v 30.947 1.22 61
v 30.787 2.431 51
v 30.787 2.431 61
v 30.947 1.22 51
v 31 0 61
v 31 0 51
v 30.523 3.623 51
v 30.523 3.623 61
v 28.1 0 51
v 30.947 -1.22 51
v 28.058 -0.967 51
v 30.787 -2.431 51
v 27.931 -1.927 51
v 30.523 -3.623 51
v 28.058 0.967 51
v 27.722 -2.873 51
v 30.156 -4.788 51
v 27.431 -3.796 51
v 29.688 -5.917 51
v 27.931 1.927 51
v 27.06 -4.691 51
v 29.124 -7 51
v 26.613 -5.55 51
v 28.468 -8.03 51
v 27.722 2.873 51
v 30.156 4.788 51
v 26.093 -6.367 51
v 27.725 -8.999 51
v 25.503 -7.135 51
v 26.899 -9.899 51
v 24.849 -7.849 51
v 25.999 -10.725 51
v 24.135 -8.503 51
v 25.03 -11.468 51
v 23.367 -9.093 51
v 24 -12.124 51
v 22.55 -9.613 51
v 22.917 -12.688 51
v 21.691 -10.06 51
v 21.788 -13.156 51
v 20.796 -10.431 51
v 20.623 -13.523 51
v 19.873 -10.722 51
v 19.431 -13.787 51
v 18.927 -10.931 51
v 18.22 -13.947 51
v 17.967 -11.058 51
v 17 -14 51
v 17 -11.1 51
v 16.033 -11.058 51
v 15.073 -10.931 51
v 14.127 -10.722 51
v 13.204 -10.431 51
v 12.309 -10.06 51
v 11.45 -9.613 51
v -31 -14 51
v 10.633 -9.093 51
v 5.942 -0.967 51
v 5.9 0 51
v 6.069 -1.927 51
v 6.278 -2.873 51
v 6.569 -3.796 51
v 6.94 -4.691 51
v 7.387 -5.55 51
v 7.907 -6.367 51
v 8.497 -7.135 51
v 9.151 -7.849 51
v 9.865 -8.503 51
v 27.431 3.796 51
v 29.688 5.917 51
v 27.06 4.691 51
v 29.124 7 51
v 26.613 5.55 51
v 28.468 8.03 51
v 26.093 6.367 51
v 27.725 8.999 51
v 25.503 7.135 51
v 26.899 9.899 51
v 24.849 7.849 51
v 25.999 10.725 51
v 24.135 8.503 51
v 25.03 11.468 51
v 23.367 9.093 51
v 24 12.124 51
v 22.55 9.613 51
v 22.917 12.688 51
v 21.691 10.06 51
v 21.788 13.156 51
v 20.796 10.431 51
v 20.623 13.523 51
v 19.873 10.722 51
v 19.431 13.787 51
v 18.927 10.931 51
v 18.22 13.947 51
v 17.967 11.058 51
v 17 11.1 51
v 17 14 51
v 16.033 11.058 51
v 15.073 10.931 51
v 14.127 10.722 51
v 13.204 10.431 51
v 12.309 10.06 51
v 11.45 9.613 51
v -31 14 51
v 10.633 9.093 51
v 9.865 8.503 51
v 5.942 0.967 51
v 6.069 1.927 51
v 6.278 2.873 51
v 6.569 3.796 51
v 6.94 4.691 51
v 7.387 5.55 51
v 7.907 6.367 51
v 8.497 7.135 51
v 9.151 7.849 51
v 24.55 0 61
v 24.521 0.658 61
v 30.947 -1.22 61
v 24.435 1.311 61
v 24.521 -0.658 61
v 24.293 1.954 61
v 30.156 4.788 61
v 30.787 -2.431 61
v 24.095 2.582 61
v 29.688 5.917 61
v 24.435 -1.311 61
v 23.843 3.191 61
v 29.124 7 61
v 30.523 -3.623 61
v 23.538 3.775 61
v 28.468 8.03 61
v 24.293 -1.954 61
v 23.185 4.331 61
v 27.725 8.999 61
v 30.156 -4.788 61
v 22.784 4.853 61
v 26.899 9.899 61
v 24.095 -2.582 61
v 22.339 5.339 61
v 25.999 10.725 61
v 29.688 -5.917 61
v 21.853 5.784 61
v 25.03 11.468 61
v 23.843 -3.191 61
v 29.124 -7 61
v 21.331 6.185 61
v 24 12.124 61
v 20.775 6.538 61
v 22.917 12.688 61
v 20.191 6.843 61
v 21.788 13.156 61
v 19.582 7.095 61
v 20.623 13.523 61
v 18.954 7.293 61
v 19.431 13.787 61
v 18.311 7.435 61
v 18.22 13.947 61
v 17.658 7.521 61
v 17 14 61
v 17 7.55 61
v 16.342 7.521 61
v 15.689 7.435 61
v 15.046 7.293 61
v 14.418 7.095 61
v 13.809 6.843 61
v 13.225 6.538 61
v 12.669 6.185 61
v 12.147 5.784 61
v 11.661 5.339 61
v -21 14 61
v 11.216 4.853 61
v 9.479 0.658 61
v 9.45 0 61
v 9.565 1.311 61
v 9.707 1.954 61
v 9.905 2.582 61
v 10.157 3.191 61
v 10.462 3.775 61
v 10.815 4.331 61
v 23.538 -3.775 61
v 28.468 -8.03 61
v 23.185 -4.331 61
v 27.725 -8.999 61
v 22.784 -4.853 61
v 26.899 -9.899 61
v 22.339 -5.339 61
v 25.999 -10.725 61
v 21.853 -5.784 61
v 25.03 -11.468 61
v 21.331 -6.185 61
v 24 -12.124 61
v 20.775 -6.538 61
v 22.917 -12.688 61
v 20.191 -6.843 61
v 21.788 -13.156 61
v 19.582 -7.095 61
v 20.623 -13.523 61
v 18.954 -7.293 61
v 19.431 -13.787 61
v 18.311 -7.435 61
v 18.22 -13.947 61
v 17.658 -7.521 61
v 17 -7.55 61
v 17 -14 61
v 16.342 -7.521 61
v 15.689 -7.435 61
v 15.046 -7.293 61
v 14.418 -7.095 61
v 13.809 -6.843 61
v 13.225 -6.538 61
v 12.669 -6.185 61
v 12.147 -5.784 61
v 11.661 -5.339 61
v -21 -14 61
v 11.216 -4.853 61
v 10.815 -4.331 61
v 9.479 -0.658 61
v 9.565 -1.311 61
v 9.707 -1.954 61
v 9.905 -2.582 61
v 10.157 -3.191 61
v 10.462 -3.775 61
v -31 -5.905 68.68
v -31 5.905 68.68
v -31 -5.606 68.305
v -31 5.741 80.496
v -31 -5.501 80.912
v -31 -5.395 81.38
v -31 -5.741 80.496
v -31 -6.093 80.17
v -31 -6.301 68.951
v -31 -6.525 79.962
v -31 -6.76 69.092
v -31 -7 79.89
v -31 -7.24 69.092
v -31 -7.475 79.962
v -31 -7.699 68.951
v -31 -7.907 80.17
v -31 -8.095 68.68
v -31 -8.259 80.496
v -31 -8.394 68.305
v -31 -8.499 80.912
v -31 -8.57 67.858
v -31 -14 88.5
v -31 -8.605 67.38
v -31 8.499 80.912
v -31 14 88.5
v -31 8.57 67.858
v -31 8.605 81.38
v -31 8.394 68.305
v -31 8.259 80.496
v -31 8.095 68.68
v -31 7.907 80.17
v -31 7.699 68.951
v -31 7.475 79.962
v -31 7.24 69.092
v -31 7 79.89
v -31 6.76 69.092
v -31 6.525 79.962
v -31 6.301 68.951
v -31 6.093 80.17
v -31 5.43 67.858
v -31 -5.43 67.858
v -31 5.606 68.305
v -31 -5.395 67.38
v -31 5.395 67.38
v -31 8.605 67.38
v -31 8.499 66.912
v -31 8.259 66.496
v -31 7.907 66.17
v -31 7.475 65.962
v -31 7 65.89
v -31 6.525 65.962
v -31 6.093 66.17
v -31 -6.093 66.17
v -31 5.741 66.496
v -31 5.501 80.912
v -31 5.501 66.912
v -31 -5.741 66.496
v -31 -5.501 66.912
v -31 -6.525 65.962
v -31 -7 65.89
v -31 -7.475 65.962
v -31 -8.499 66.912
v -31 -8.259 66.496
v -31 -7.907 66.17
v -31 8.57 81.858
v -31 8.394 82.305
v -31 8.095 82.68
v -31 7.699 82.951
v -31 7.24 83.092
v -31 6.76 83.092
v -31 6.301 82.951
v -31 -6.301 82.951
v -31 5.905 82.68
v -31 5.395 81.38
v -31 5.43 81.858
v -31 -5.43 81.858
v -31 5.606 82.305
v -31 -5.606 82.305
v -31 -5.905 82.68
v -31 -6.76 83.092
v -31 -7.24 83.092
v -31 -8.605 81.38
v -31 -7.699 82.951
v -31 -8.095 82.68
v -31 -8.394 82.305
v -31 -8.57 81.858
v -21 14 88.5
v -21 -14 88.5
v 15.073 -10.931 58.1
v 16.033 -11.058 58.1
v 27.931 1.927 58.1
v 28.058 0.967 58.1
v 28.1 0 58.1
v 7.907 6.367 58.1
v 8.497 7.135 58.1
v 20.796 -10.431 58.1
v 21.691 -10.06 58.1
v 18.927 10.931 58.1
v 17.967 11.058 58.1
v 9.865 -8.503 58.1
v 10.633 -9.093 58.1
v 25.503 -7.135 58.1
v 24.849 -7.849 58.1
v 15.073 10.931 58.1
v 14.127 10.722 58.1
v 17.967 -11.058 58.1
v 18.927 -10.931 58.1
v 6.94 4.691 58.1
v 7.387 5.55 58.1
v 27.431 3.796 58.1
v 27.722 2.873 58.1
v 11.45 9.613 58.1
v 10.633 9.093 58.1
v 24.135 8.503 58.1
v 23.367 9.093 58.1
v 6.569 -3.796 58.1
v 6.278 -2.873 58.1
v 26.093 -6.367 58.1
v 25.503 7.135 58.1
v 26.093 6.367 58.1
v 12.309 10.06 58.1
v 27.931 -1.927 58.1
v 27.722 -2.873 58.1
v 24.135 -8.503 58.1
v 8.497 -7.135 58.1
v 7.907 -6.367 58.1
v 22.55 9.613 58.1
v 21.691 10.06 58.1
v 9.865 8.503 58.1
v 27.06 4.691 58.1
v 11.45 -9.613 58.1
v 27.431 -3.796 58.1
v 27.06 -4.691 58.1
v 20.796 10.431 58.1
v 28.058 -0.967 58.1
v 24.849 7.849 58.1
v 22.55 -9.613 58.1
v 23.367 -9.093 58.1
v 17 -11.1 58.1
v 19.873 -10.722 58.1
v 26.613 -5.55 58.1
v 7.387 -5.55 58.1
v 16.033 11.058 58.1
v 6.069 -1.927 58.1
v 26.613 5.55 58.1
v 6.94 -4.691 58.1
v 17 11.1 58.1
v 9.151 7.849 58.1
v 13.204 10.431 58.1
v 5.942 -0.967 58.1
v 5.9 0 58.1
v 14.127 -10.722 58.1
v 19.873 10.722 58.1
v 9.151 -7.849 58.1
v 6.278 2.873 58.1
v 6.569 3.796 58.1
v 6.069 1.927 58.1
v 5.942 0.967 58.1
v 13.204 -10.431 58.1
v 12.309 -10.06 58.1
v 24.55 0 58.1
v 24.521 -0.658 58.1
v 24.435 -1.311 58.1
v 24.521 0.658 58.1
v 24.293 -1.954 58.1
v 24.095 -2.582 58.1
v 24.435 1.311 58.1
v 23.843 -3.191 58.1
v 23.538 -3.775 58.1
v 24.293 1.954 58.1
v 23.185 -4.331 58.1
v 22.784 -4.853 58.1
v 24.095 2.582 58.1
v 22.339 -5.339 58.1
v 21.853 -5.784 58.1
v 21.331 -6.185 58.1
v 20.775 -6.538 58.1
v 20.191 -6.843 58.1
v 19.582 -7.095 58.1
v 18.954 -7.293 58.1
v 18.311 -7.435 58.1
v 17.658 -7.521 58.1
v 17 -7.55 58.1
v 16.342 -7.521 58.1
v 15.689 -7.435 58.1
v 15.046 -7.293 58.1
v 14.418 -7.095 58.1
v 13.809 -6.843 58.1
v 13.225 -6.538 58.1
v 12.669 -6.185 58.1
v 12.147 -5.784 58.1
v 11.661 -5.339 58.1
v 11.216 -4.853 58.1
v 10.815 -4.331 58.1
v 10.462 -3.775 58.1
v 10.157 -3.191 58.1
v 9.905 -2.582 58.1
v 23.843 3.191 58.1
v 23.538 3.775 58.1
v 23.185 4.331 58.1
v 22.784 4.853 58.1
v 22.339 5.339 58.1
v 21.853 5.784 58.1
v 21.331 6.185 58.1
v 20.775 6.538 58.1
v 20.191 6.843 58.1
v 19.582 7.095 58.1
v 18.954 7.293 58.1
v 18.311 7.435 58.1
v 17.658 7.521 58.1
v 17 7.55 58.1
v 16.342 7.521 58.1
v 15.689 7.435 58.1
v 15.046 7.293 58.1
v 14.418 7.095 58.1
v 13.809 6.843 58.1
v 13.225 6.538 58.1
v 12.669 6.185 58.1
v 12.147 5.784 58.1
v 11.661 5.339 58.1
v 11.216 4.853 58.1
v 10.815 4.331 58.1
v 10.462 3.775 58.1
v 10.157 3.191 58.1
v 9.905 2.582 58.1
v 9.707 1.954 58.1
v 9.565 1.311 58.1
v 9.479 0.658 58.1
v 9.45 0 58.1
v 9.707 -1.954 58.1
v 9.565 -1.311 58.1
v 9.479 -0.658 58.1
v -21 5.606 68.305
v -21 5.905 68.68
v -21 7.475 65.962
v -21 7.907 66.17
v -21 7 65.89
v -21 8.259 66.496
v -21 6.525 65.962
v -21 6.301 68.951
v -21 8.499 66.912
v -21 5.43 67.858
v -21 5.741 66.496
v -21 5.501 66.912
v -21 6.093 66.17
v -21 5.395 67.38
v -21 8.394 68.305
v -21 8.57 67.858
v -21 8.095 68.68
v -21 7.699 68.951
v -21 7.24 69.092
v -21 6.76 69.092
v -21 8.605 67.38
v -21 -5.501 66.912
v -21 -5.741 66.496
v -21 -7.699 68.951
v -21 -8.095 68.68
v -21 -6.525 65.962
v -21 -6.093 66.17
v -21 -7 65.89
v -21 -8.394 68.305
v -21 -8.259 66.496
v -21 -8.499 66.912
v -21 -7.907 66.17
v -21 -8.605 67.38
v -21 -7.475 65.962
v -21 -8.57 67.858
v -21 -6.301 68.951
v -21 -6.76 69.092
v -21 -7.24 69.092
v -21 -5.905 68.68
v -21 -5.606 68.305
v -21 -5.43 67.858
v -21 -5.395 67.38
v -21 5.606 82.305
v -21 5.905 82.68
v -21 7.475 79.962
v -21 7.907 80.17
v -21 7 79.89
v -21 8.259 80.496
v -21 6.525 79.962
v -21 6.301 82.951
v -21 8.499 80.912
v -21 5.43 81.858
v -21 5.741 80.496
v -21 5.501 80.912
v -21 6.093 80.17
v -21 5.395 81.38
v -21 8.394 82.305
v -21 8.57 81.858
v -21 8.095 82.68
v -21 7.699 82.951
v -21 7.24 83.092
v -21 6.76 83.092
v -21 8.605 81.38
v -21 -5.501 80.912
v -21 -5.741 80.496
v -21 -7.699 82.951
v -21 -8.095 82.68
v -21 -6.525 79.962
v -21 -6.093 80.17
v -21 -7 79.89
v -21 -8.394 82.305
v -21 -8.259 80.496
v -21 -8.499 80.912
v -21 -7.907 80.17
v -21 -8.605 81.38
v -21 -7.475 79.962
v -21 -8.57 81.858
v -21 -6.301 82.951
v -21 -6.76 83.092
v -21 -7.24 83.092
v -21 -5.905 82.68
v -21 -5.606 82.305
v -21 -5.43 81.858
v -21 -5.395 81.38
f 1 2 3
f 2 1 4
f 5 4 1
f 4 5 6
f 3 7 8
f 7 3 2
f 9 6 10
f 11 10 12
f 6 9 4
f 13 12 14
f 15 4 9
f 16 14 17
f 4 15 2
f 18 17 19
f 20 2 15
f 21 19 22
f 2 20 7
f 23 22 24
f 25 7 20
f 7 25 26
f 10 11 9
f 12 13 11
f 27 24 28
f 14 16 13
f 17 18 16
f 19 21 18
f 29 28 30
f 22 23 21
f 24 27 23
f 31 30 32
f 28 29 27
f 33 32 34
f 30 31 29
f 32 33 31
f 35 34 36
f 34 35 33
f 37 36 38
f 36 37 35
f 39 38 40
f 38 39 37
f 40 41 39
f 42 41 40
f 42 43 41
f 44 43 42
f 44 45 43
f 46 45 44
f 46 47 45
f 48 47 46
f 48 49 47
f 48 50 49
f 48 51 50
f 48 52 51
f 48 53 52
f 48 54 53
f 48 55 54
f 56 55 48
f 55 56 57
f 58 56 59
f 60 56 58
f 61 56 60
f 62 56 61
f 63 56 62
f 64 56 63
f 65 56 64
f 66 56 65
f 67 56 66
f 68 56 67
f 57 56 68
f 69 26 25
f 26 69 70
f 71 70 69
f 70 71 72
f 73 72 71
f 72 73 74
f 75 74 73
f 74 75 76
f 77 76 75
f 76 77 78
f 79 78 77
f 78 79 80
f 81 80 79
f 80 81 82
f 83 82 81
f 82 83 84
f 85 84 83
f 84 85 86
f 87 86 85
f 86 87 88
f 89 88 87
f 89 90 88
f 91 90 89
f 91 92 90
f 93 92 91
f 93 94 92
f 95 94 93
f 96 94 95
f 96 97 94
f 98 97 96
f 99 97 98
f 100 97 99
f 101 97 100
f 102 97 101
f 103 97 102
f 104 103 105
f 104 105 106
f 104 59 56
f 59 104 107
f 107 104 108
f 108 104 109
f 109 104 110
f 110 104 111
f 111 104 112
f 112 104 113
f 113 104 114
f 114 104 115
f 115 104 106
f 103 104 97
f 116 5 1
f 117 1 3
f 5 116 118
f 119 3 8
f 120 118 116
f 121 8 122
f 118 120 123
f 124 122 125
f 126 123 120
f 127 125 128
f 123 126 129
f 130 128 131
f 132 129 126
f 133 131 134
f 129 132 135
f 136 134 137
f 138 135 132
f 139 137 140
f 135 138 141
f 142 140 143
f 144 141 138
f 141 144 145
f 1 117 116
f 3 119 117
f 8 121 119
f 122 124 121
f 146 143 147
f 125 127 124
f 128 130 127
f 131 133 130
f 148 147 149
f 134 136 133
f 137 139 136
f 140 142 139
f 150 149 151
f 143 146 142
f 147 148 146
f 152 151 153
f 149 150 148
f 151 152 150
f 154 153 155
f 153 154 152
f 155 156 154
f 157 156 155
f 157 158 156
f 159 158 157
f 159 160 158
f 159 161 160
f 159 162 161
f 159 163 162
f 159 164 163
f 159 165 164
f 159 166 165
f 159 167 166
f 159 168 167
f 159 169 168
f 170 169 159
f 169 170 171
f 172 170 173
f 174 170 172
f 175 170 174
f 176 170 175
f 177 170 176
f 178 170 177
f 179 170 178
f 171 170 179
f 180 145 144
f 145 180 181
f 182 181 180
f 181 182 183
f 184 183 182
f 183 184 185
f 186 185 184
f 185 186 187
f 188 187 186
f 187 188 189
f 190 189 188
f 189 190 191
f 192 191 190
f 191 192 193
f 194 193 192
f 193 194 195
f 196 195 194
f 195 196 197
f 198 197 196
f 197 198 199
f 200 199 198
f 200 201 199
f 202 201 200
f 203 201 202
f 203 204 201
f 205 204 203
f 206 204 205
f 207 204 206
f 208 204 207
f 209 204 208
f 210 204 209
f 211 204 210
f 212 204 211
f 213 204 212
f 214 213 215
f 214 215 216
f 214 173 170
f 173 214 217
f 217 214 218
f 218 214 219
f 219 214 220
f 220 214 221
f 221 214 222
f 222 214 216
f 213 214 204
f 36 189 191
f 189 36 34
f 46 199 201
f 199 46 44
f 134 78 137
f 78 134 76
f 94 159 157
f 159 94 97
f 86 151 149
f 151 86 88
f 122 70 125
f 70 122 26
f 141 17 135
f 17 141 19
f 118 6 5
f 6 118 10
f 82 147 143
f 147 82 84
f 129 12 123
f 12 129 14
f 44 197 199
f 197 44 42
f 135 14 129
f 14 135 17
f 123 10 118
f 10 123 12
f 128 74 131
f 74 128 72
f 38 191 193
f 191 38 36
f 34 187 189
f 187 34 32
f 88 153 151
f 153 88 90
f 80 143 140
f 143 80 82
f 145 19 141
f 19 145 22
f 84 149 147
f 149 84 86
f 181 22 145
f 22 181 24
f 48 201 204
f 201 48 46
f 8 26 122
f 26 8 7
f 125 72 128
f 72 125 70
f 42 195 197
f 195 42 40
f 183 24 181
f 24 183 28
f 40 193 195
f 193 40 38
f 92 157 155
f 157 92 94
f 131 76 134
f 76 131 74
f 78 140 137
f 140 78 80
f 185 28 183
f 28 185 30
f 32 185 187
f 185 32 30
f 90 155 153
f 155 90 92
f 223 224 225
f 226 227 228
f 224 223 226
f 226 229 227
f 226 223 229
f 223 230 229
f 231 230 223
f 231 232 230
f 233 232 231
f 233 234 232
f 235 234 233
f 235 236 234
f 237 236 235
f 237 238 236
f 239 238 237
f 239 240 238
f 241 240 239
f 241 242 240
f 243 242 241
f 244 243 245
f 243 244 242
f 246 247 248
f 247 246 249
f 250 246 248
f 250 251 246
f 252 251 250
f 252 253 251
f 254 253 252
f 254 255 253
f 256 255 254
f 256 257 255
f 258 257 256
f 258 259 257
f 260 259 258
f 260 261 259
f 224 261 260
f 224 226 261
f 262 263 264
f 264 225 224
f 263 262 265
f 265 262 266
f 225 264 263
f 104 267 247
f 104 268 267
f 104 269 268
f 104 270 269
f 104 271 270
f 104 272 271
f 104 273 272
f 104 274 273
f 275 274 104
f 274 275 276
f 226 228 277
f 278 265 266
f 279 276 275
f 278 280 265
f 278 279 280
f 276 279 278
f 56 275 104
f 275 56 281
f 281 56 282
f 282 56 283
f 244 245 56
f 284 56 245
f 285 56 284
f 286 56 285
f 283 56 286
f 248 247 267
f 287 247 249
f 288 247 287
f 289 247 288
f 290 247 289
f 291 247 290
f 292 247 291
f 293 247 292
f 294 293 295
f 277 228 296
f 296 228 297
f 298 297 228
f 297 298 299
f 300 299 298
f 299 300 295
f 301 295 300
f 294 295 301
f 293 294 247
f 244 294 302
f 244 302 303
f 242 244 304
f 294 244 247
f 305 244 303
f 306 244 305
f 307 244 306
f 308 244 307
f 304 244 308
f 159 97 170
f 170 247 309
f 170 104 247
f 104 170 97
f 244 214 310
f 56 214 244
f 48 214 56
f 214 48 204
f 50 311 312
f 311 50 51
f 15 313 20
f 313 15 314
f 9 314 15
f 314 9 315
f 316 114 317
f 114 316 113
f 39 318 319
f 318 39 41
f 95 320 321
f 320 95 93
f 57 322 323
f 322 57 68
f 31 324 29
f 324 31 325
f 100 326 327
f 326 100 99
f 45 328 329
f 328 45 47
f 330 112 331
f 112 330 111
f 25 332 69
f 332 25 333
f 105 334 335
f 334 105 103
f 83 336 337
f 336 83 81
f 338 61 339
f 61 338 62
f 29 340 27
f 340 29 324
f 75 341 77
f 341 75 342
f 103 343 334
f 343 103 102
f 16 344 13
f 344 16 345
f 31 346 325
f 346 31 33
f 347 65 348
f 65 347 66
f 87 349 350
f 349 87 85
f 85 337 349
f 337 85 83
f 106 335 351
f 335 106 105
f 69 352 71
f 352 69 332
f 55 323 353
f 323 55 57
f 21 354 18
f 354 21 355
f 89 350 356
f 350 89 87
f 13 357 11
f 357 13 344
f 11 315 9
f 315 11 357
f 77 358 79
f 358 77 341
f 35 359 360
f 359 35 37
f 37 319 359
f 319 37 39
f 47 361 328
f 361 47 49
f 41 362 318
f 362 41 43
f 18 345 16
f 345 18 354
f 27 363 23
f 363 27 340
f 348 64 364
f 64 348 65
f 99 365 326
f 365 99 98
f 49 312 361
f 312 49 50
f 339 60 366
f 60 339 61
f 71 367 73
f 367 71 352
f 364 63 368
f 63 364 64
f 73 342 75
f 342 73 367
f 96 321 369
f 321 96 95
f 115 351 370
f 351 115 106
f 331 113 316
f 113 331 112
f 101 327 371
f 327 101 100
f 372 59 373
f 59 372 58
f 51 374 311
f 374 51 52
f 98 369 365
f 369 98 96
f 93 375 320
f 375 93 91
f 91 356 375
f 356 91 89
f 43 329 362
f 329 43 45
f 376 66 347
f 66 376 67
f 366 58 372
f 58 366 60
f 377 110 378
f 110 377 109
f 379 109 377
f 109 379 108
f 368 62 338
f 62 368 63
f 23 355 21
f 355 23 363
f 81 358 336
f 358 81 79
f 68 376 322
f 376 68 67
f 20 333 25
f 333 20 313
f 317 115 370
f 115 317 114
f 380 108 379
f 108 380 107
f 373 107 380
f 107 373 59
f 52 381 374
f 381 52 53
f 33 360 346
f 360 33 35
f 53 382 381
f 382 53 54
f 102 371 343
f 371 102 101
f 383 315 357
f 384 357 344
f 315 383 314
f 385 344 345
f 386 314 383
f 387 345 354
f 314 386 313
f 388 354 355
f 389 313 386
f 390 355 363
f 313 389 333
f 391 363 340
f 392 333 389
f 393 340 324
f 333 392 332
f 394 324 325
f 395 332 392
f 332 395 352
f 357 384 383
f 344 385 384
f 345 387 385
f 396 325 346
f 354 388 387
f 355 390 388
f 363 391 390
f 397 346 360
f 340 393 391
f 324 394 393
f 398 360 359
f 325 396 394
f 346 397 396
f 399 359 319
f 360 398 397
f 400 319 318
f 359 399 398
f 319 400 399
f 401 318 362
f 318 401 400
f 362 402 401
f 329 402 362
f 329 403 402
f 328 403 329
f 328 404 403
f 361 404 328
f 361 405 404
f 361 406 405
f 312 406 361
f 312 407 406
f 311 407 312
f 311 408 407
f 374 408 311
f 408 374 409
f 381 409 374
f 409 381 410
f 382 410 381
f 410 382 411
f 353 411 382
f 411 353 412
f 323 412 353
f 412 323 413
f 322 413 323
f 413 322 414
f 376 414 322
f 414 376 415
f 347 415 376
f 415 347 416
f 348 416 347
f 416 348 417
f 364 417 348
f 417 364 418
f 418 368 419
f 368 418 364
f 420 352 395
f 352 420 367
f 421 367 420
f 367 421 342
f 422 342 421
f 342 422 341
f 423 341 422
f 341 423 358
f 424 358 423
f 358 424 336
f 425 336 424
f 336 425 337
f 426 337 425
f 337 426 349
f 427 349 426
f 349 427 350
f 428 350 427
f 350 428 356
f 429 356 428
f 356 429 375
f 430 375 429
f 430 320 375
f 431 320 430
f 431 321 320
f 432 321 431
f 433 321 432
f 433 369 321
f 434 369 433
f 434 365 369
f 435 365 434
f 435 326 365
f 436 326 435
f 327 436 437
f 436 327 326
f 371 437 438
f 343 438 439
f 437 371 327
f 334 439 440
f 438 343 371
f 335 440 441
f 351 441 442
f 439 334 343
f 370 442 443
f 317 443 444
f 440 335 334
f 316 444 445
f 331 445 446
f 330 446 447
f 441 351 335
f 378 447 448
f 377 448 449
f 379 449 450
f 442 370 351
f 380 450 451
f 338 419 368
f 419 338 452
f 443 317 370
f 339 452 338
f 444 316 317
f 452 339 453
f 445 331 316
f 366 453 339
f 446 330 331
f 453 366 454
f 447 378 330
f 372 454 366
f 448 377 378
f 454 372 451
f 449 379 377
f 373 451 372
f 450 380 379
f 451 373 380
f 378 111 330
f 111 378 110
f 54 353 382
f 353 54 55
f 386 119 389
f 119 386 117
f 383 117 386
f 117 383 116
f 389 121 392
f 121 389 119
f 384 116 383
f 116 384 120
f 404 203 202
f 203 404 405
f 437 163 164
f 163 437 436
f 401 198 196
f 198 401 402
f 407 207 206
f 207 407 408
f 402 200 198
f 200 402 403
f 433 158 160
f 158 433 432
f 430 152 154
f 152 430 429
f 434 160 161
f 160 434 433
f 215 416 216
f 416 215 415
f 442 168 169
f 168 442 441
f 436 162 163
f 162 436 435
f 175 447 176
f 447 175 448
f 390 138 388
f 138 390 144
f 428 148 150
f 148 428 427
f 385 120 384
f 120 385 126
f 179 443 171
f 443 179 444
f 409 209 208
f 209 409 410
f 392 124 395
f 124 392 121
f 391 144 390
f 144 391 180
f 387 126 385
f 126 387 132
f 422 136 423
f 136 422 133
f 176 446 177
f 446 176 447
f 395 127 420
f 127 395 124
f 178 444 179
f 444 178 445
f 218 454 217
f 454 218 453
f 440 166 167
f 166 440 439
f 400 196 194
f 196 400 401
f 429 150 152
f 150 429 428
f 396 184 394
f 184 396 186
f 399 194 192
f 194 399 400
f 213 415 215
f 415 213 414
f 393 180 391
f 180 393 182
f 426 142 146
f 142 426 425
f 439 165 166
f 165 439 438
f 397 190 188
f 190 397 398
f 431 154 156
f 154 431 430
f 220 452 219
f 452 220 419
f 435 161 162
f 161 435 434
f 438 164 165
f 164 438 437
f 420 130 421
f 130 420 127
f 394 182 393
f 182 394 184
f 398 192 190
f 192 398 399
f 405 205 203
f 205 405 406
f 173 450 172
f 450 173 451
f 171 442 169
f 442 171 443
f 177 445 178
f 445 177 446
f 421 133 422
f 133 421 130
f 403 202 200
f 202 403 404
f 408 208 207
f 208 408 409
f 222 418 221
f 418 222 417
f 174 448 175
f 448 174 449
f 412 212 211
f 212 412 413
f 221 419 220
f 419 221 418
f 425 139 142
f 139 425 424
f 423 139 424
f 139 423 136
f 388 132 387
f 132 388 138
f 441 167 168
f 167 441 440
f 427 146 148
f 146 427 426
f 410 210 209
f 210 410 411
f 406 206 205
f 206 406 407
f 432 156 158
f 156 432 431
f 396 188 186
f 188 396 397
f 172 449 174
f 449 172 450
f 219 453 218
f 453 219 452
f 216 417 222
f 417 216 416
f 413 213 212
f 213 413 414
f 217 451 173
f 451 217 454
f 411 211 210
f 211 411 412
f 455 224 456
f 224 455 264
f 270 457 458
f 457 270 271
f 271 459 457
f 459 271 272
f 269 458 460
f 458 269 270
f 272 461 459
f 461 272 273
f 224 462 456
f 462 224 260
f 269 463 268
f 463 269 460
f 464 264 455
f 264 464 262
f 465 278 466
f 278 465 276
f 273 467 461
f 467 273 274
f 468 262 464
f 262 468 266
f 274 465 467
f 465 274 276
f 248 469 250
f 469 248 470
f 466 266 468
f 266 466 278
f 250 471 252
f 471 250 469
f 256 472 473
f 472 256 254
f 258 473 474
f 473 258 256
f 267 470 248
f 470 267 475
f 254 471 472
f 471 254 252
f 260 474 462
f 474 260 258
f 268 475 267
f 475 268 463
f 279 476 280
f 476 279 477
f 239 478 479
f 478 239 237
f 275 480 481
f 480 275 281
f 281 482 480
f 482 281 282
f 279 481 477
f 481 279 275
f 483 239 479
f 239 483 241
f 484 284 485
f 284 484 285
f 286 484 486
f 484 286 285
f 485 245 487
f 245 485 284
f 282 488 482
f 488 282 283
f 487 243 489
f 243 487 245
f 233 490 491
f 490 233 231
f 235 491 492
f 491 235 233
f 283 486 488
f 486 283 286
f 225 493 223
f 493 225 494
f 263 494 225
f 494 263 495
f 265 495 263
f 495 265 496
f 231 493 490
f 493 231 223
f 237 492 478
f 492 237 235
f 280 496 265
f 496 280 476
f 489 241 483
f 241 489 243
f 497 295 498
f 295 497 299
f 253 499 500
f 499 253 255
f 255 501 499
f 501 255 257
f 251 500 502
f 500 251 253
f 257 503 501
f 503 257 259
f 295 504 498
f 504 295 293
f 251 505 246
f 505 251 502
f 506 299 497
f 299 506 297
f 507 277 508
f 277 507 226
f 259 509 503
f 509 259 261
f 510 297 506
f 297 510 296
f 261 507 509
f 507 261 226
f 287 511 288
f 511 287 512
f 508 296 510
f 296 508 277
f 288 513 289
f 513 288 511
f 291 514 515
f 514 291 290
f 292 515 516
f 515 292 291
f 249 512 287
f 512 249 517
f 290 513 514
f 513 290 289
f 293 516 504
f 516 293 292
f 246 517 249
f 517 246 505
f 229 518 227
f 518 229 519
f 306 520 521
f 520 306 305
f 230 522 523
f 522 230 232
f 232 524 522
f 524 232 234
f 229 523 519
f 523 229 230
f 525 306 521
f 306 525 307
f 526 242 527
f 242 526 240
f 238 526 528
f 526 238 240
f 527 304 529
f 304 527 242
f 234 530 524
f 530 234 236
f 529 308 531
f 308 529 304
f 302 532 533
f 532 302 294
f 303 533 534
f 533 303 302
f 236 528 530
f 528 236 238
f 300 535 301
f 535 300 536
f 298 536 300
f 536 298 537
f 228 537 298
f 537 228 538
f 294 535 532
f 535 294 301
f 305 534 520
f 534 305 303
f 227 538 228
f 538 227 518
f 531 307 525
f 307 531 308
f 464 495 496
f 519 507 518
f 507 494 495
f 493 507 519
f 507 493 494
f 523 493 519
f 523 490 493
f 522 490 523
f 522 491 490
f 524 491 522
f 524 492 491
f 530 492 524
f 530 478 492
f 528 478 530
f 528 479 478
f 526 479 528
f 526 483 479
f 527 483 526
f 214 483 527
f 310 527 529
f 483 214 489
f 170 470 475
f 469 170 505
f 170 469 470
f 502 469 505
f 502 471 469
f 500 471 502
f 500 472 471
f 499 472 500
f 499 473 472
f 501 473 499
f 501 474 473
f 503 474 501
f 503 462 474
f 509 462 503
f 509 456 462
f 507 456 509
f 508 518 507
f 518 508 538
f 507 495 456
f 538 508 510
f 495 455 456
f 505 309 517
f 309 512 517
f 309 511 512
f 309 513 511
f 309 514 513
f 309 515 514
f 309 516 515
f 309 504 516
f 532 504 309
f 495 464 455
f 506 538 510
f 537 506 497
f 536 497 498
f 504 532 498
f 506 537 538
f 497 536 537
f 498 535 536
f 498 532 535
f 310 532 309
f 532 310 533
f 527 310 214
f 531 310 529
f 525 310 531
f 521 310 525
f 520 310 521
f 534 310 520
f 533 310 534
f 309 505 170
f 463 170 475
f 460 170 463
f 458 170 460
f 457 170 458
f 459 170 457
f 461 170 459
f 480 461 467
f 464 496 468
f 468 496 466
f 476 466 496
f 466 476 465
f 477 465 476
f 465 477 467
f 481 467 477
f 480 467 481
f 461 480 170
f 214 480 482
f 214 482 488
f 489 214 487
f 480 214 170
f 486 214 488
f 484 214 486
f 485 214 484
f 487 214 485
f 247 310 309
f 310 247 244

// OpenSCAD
$fs=0.5;
$fa=5;

th      = 3;
screw_r = 3.22/2;

bearing_ir = 8.2/2;
bearing_or = 22/2;
bearing_w  = 7;
bearing_th = 1.6;
bearing_i  = 0.01;
bearing_sr = bearing_or + th + screw_r*2;

caster_r=48/2;
caster_mount_r=7/2;
caster_w=38.5;

module bearing() {
    difference() {
        cylinder(r=bearing_or, h=bearing_w);
        translate([0, 0, -1])
        cylinder(r=bearing_ir, h=bearing_w+2);

        translate([0, 0, bearing_w-bearing_i])
        difference() {
            cylinder(r=bearing_or-bearing_th, h=bearing_w);
            translate([0, 0, -1])
            cylinder(r=bearing_ir+bearing_th, h=bearing_w+2);
        }

        translate([0, 0, bearing_i-bearing_w])
        difference() {
            cylinder(r=bearing_or-bearing_th, h=bearing_w);
            translate([0, 0, -1])
            cylinder(r=bearing_ir+bearing_th, h=bearing_w+2);
        }
    }
}

module caster() {
    translate([0, caster_w/2, caster_r])
    rotate([90, 0, 0])
    cylinder(r=caster_r, h=caster_w);
    
    translate([caster_r-4-th, 0, caster_r+th])
    difference() {
        cylinder(r=caster_mount_r+th, h=caster_r);
        translate([0, 0, -1])
        cylinder(r=caster_mount_r, h=caster_r+2);
    }
}
%caster();

module caster_mount() {
    translate([caster_r-4-th, 0, caster_r*2+th])
    %bearing();
    
    translate([caster_r-4-th, 0, caster_r*2+th])
    difference() {
        union() {
            cylinder(r=bearing_or+th, h=bearing_w+th);
            translate([-caster_r, 0, (bearing_w+th)/2])
            cube([
                (caster_r*2),
                (bearing_or+th)*2,
                bearing_w+th
            ], center=true);
        }

        translate([0, 0, -0.1])
        cylinder(r=bearing_or+0.1, h=bearing_w+0.2);

        cylinder(
            r=(bearing_ir+bearing_or)/2,
            h=bearing_w+th*2
        );
    }
    translate([
        -caster_r-2,
        0,
        caster_r*2+th*1.5+bearing_or*2
    ])
    difference() {
        cube([
            bearing_w+th,
            (bearing_or+th)*2,
            (bearing_or+th)*2
        ], center=true);
        
        translate([-bearing_w, 0, 0])
        rotate([0, 90, 0])
        union() {
            translate([bearing_w, bearing_w, 0])
            cylinder(r=screw_r, h=(bearing_w+th)*2);
            translate([bearing_w, -bearing_w, 0])
            cylinder(r=screw_r, h=(bearing_w+th)*2);
            translate([-bearing_w, bearing_w, 0])
            cylinder(r=screw_r, h=(bearing_w+th)*2);
            translate([-bearing_w, -bearing_w, 0])
            cylinder(r=screw_r, h=(bearing_w+th)*2);
        }
    }
}
caster_mount();

module caster_mount_rod() {
  difference() {
    union() {
      translate([0, 0, bearing_w])
      cylinder(r=bearing_ir+bearing_th, h=th);
      cylinder(
        r=bearing_ir-bearing_i,
        h=bearing_w+th
      );
      translate([0, 0, -bearing_w-th])
      cylinder(
        r=caster_mount_r,
        h=bearing_w+th
      );
    }

    translate([0, 0, -50])
    cylinder(r=screw_r, h=100);
  }
}
//translate([caster_r-4-th, 0, caster_r*2+th])caster_mount_rod();
